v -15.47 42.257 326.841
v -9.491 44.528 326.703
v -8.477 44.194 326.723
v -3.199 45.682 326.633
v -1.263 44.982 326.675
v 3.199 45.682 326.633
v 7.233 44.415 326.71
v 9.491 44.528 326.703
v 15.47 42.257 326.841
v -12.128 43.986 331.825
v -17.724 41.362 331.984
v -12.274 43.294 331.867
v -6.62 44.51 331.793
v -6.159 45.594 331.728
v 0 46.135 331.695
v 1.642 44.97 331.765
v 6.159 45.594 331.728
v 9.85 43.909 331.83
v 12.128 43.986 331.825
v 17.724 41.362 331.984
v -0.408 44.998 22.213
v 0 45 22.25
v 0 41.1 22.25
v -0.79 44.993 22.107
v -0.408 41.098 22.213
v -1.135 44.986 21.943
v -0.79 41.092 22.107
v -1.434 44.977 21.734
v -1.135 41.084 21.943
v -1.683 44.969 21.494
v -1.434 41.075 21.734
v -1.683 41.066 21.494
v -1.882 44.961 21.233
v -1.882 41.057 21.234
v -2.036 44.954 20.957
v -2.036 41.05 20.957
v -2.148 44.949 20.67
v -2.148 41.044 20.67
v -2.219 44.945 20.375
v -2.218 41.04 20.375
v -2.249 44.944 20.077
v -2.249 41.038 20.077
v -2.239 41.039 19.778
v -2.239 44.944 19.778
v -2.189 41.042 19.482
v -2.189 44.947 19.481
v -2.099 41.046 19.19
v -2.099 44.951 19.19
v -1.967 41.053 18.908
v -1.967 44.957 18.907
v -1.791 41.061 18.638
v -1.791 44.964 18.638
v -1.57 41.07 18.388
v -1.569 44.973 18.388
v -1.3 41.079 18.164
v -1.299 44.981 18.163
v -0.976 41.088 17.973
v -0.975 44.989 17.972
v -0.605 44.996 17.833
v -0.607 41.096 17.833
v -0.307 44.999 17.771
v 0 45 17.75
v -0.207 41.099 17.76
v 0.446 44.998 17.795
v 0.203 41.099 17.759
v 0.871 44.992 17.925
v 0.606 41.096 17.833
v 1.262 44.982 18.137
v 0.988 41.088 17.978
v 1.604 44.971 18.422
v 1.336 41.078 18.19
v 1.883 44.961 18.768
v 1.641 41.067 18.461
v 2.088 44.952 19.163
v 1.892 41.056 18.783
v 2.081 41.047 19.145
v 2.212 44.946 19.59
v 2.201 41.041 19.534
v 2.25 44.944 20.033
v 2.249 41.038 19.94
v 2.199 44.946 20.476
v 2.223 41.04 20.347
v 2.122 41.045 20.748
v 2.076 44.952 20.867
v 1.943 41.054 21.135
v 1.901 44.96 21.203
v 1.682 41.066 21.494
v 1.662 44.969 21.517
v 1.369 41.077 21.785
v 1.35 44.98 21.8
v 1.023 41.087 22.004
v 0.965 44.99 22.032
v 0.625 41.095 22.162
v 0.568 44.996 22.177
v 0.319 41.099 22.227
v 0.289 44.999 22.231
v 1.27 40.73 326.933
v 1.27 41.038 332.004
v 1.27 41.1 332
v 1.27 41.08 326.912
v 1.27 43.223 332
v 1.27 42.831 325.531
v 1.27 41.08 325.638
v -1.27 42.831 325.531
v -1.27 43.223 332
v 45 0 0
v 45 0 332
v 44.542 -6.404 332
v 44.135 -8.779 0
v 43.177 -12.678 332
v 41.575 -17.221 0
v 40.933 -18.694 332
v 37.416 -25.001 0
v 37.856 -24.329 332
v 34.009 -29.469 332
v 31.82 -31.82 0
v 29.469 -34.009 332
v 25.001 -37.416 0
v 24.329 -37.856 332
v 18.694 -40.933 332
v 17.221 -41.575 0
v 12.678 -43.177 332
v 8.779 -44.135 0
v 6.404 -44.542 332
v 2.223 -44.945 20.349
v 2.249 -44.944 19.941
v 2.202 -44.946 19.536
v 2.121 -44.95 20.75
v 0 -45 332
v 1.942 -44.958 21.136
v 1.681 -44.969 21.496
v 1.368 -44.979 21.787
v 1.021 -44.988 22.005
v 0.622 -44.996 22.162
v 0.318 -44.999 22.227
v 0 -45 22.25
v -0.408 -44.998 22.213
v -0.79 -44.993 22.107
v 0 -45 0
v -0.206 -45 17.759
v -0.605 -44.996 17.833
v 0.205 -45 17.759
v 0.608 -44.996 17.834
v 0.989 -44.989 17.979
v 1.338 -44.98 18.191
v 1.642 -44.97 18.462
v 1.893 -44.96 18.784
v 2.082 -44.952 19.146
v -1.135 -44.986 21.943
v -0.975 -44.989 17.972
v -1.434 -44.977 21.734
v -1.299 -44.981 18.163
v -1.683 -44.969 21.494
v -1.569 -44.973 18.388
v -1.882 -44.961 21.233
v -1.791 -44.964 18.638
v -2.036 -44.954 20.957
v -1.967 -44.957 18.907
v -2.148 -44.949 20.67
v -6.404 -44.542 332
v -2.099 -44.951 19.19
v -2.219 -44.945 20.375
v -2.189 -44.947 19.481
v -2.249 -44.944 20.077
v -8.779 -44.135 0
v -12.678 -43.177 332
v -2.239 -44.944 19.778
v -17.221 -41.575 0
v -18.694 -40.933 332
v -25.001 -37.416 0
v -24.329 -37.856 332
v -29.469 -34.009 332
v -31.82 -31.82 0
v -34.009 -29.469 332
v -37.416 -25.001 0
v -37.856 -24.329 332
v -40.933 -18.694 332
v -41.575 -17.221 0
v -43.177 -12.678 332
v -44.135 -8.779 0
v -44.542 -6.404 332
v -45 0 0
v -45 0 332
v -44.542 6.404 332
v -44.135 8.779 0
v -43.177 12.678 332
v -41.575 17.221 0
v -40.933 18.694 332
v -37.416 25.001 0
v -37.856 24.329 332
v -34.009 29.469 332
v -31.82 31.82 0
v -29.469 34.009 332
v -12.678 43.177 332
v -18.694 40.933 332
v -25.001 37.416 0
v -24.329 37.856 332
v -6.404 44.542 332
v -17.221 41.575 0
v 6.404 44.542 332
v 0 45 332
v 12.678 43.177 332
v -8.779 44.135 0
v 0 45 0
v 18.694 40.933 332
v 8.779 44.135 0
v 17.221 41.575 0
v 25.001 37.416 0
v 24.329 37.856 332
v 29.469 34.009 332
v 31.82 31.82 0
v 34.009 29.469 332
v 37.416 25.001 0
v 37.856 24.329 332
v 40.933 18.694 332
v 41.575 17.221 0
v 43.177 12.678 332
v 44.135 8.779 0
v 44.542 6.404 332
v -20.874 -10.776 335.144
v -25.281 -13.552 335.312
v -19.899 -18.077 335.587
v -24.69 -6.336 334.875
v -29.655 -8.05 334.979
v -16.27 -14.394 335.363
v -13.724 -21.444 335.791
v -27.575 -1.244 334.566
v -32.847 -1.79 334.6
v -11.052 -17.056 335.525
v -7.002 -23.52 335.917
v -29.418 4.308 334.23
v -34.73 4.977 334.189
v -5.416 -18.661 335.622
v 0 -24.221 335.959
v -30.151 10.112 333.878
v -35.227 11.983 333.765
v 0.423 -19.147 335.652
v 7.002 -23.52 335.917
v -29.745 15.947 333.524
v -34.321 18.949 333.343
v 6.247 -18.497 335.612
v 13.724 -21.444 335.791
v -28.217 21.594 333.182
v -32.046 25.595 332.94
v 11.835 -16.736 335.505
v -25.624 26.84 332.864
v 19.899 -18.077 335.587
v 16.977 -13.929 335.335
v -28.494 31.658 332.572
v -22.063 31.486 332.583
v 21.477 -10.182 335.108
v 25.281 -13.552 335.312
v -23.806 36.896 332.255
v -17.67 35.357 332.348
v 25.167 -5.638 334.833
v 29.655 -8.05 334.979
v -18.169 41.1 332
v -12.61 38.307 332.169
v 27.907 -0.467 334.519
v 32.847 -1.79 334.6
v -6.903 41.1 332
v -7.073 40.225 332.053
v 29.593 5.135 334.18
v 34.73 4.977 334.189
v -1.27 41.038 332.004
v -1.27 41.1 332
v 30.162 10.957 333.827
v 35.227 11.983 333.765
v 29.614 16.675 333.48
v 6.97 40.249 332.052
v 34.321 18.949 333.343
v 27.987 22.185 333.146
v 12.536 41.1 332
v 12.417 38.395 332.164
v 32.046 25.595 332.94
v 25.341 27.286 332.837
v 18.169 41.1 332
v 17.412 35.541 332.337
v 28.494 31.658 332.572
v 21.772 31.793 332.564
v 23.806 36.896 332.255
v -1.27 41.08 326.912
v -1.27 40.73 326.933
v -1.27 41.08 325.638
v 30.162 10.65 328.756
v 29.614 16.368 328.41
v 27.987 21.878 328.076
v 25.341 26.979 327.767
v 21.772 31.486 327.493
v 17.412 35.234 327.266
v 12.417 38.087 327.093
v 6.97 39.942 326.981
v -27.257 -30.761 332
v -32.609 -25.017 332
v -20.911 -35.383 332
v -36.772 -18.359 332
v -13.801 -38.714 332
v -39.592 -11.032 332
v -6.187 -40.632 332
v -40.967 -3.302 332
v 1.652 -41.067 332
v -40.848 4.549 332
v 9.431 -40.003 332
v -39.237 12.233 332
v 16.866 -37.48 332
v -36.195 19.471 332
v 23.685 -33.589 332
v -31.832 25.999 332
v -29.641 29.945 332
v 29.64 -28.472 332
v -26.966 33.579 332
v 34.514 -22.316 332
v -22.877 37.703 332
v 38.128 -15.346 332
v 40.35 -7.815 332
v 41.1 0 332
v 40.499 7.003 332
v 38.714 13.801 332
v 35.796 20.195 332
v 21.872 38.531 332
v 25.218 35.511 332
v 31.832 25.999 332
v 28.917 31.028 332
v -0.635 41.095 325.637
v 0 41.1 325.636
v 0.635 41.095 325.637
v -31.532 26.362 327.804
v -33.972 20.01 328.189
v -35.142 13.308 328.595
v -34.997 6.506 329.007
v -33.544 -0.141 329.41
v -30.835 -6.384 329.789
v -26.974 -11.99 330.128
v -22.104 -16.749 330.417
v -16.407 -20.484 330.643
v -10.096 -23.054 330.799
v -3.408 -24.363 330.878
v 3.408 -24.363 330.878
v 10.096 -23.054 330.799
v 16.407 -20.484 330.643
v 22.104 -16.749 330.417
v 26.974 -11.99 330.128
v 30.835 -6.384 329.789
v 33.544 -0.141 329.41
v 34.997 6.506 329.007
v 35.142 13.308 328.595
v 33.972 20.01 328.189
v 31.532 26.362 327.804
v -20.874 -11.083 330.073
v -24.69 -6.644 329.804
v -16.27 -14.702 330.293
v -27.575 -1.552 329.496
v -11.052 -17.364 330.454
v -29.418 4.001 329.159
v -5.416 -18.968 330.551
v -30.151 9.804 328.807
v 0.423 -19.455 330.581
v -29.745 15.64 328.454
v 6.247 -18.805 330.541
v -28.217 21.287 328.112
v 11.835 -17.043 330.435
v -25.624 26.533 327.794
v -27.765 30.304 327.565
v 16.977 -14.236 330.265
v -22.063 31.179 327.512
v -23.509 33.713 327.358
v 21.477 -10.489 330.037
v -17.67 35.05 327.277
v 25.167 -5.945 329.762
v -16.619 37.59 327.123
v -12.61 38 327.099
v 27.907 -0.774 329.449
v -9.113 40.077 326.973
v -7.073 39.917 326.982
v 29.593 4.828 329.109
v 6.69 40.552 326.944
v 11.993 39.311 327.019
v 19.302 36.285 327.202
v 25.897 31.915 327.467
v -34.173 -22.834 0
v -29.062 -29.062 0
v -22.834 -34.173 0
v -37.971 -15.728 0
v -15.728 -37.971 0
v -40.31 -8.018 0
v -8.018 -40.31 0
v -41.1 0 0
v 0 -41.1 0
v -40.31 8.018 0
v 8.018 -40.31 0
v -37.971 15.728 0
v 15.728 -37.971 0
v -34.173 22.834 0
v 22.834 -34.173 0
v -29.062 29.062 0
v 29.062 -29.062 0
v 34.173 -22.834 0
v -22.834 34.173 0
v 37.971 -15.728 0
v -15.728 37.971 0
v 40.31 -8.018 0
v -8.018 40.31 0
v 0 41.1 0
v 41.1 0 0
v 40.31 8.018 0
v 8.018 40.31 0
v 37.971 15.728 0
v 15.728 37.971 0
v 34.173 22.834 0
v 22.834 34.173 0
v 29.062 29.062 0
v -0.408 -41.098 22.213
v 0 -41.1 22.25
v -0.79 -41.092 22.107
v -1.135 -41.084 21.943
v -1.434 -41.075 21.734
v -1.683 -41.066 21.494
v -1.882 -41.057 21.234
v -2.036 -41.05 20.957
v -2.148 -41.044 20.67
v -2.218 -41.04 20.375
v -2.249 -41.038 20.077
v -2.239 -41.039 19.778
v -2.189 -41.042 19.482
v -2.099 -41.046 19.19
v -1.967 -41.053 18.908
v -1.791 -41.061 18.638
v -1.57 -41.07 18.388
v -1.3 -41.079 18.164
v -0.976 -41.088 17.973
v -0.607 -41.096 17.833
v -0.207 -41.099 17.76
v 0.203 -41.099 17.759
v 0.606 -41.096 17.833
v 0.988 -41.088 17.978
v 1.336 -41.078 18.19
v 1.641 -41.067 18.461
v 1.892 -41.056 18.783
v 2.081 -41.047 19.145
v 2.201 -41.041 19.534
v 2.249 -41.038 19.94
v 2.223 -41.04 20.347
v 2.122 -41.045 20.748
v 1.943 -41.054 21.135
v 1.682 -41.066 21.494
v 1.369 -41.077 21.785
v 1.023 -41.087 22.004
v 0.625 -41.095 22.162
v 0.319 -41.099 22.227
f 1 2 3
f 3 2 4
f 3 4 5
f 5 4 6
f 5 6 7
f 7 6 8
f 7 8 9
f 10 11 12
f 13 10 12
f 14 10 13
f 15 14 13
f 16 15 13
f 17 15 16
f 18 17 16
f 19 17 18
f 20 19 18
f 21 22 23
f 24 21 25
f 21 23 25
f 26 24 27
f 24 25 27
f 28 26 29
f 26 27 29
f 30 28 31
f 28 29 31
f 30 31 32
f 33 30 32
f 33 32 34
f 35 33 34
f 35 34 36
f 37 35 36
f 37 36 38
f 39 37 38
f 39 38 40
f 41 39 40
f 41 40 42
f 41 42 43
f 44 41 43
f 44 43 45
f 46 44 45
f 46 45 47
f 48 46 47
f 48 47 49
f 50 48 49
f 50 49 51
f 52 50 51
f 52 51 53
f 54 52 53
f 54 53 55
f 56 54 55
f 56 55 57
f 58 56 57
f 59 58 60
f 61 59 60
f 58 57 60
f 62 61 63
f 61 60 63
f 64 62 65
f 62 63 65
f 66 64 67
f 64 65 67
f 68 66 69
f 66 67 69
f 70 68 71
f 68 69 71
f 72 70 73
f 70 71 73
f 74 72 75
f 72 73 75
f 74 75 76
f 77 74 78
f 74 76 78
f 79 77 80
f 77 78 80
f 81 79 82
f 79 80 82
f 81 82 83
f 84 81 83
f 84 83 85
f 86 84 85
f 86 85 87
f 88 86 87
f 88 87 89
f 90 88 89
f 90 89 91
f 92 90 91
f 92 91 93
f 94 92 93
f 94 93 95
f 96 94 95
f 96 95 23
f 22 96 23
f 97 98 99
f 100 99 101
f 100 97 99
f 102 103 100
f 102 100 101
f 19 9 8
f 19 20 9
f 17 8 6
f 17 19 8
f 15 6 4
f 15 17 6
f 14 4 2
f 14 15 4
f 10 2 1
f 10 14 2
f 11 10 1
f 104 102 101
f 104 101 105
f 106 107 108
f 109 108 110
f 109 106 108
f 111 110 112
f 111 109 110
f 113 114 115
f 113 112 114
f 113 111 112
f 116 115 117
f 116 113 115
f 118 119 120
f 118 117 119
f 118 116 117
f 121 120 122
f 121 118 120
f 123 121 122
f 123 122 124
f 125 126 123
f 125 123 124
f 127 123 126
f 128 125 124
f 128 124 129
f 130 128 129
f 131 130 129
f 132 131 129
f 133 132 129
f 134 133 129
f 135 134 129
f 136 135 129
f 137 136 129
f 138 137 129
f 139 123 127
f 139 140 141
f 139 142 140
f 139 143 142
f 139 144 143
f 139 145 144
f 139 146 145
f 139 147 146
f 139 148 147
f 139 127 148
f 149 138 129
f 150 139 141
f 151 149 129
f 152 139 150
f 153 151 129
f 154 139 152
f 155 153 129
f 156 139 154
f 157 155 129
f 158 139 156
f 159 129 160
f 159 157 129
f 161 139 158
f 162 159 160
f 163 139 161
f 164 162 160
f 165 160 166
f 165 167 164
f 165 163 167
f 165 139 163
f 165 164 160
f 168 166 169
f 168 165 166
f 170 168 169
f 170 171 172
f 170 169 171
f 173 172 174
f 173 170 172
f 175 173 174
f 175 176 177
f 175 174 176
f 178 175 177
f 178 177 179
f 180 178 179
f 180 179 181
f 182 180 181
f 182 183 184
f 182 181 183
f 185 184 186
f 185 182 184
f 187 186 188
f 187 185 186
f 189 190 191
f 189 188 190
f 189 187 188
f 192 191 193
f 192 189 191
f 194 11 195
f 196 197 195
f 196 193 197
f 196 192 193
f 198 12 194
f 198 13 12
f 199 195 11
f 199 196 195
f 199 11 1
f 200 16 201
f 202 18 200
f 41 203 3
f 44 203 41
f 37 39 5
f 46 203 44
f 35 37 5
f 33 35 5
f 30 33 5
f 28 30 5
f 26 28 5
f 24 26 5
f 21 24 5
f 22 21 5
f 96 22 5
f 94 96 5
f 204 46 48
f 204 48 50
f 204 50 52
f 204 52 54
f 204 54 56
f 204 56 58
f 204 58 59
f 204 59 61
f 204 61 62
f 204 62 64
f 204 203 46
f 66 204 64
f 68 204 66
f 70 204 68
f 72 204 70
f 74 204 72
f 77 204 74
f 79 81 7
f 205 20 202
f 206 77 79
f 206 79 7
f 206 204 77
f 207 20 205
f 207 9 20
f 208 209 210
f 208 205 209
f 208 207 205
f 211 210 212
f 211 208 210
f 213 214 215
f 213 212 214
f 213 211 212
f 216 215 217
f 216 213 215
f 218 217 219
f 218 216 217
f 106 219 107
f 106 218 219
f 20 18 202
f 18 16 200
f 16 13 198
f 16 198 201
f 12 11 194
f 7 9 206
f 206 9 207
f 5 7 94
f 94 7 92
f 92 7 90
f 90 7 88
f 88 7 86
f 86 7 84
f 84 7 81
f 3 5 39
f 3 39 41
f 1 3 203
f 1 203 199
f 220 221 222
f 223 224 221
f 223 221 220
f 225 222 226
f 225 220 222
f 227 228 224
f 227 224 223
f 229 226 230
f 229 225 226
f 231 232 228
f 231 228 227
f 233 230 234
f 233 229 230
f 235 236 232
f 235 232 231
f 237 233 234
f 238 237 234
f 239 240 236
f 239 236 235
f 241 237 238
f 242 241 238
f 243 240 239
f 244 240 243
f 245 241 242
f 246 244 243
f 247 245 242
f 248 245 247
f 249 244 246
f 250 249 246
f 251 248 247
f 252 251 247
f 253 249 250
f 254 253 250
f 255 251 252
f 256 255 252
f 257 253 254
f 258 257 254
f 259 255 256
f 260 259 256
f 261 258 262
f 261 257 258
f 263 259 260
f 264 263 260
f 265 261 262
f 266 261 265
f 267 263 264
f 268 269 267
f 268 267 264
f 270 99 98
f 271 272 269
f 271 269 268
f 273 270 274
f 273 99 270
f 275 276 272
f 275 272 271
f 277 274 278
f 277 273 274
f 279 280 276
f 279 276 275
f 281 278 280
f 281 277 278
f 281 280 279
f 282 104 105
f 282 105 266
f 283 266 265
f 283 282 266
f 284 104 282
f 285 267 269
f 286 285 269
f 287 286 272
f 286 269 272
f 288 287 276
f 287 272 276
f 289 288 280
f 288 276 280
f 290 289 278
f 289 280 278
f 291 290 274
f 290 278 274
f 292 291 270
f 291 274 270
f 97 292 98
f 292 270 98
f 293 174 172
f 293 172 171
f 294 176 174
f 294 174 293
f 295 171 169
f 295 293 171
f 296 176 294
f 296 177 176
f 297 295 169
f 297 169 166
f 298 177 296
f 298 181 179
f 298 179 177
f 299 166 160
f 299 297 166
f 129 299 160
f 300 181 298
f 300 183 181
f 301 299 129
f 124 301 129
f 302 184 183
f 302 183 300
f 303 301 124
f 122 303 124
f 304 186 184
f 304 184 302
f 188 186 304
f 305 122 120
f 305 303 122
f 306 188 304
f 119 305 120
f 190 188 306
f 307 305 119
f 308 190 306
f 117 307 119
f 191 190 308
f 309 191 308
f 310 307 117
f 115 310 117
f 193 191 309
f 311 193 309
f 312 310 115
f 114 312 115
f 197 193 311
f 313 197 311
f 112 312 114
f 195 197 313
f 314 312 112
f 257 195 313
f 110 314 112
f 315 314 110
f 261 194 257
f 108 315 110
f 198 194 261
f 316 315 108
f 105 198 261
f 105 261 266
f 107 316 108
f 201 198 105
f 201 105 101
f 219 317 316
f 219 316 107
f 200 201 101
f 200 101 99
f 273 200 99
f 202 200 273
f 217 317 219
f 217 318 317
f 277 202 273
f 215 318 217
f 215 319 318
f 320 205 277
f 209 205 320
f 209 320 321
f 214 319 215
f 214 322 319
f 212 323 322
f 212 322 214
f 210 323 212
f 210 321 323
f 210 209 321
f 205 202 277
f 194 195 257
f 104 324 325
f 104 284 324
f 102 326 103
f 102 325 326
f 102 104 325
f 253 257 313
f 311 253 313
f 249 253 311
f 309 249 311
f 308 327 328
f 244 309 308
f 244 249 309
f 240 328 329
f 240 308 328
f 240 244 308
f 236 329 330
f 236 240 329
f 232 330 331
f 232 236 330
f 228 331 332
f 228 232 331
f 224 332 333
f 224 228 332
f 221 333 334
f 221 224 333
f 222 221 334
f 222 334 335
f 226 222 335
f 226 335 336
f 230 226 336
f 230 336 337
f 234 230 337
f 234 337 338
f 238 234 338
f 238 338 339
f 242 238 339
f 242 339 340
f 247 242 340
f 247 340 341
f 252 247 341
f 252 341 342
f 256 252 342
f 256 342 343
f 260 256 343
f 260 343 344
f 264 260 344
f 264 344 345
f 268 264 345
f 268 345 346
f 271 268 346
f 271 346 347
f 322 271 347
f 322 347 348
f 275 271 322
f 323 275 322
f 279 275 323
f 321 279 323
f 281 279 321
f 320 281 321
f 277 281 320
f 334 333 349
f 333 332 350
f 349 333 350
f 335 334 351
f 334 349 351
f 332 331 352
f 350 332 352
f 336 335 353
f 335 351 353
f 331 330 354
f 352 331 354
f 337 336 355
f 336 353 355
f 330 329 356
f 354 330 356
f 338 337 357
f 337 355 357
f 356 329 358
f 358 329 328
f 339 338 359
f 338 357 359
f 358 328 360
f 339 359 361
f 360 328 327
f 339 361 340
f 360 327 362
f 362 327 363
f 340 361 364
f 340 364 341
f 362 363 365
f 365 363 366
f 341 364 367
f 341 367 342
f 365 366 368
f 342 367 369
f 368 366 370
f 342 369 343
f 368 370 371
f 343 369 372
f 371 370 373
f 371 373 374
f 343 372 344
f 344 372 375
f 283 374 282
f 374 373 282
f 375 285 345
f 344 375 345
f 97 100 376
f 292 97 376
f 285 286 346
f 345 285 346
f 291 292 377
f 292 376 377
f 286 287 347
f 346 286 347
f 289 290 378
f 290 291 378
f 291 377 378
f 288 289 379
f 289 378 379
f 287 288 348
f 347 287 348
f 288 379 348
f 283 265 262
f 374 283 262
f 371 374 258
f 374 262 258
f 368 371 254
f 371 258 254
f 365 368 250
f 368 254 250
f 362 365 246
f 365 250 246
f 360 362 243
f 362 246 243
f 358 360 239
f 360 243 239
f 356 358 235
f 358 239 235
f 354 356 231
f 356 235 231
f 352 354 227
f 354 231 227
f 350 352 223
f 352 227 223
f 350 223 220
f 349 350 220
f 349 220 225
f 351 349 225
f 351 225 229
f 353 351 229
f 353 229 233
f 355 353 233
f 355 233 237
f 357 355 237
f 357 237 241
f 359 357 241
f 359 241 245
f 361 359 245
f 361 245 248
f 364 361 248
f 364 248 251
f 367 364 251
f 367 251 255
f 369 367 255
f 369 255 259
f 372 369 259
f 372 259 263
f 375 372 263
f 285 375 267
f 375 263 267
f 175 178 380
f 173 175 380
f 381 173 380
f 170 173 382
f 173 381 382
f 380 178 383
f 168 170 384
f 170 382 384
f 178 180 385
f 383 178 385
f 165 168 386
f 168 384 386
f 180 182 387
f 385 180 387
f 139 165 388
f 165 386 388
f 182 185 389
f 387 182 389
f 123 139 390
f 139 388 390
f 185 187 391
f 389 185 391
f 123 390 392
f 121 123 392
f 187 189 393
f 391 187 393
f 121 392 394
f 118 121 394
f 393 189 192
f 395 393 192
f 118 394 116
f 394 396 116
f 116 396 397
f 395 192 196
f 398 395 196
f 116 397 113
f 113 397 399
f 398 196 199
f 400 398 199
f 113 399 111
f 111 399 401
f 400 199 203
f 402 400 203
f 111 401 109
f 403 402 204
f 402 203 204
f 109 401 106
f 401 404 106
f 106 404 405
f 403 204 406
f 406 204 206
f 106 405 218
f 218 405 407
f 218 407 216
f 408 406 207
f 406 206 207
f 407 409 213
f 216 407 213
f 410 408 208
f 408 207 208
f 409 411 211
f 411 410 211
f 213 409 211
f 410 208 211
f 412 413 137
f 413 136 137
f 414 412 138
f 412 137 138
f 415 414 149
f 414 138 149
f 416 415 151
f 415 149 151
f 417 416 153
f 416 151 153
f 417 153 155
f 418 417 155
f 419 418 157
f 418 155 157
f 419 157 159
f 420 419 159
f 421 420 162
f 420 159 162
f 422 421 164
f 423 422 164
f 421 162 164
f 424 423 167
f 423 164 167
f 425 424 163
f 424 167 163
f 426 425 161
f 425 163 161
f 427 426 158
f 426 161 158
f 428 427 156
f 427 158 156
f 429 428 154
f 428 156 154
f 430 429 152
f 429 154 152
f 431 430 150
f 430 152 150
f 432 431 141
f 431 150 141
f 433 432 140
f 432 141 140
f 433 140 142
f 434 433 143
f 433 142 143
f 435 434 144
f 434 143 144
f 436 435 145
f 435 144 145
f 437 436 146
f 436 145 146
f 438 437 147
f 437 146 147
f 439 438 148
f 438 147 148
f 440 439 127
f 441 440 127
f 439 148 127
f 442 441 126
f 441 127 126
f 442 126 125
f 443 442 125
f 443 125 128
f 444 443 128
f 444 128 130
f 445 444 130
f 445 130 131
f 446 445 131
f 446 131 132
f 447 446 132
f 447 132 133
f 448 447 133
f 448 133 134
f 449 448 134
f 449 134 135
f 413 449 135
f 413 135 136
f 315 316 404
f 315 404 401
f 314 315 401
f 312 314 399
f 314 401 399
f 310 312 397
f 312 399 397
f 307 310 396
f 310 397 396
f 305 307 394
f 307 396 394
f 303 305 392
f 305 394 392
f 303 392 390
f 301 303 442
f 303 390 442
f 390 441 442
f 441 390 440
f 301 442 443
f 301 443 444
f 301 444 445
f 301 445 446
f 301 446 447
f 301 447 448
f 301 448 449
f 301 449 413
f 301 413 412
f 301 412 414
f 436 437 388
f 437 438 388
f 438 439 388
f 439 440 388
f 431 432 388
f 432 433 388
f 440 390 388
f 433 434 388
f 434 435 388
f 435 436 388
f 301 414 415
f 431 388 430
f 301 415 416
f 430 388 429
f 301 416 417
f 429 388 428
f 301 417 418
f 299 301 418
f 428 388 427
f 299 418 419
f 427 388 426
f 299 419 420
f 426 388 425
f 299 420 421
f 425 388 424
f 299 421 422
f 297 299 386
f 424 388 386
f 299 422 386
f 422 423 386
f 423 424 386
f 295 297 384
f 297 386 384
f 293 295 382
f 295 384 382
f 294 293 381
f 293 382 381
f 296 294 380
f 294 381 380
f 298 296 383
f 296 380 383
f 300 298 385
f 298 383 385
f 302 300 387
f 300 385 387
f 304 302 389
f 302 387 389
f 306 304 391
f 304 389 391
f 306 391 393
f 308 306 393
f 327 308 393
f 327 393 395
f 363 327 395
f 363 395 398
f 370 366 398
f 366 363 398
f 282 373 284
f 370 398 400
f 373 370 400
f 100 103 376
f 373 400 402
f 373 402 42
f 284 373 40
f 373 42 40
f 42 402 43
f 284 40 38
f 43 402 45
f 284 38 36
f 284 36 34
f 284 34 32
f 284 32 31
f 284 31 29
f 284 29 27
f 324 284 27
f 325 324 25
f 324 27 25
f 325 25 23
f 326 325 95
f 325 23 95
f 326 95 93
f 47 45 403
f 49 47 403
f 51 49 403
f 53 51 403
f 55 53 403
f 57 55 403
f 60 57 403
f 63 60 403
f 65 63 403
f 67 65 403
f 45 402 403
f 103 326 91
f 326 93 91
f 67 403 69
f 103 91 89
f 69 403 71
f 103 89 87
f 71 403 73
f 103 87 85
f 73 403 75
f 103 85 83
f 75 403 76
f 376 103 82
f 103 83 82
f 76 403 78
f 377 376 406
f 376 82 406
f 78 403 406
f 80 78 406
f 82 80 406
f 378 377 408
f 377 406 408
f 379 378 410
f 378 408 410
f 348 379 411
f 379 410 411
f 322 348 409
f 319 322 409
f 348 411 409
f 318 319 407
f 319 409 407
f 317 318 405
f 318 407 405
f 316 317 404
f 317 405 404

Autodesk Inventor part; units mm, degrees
ref_plane "YZ Plane" through (0, 0, 0) normal (1, 0, 0) x (0, 1, 0)
sketch "Sketch1" plane through (0, 0, 0) normal (0, 0, 1) x (1, 0, 0)
  circle A0 centre (0, 0) radius 45
  circle A1 centre (0, 0) radius 41.1
  dimension "d0" = 90
  dimension "d2" = 3.9
extrude "Extrusion1" add sketch "Sketch1" along normal blind 332
sketch "Sketch2" plane through (0, 0, 332) normal (0, 0, 1) x (1, 0, 0)
  circle A0 centre (0, 0) radius 41.1 projected
  circle A1 centre (0, 0) radius 45 projected
  point P0 (0, 45)
ref_plane "Work Plane1" through (0, 45, 332) normal (0, 1, 0) x (-1, 0, 0)
sketch "Sketch5" plane through (0, 45, 332) normal (0, 1, 0) x (-1, 0, 0)
  circle A0 centre (0, -312) radius 4.4901
  point P0 (0, -332)
  dimension "d25" = 20
hole "nailHole" at (0, 45, 20) direction (0, -1, 0) diameter 4.5 end through all
sketch "Sketch6" plane through (0, 0, 332) normal (0, 0, 1) x (1, 0, 0)
  circle A0 centre (0, 0) radius 41.1 projected
  circle A1 centre (0, 0) radius 45 projected
  point P0 (0, 45)
ref_plane "Work Plane2" through (0, 45, 332) normal (0, 1, 0) x (-1, 0, 0)
sketch "Sketch10" plane through (0, 0, 332) normal (0, 0, 1) x (1, 0, 0)
  circle A0 centre (0, 0) radius 41.1 projected
  circle A1 centre (0, 0) radius 45 projected
  line L0 (0, 41.1) -> (46.8002, 41.1) construction
ref_plane "Work Plane3" through (0, 41.1, 332) normal (0, 0.0605, 0.9982) x (1, 0, 0)
sketch "Sketch11" plane through (0, 41.1, 332) normal (0, 0.0605, 0.9982) x (1, 0, 0)
  circle A0 centre (0, -30.1983) radius 30.1625
  circle A1 centre (0, -30.1983) radius 35.2425
  point P0 (0, -20.93)
  dimension "d44" = 60.325
  dimension "d45" = 5.08
extrude "INSERT_GUIDE_NOTFAB" add sketch "Sketch11" against normal blind 5.08
sketch "Sketch12" plane through (0, 41.1, 332) normal (0, 0.0605, 0.9982) x (1, 0, 0)
  circle A0 centre (0, -30.1983) radius 30.1625 projected
  line L0 (-1.27, -0.4213) -> (1.27, -0.4213)
  line L1 (1.27, -0.4213) -> (1.27, 2.1187)
  line L2 (1.27, 2.1187) -> (-1.27, 2.1187)
  line L3 (-1.27, 2.1187) -> (-1.27, -0.4213)
  line L4 (0, 2.1187) -> (0, -0.4213) construction
  line L5 (0, -20.93) -> (0, -30.1983) construction
  dimension "d48" = 2.54
  dimension "d49" = 2.54
extrude "INSERT_KEY_NOTFAB" cut sketch "Sketch12" along normal mid plane 12.7 contours L1 L0 L3 A0 | A0 L3 L2 L1 picked at (0.1411, -0.2938)
sketch "Sketch14" plane through (0, 0, 332) normal (0, 0, 1) x (1, 0, 0)
  circle A0 centre (0, 0) radius 41.1 projected
  line L0 (-6.35, 38.1) -> (6.35, 38.1)
  line L1 (0, 41.1) -> (0, 38.1) construction
  line L2 (-6.35, 38.1) -> (-6.35, 40.6065)
  line L3 (6.35, 38.1) -> (6.35, 40.6065)
  dimension "d52" = 12.7
  dimension "d53" = 3
extrude "shim" [suppressed]
equation "\"d0\" = sleeveOD"
equation "\"d2\" = sleeveWall"
equation "\"d3\" = sleeveLength"
equation "\"d25\" = nailDelta"
equation "\"sleeveOD\" = 90"
equation "\"sleeveWall\" = 3.9"
equation "\"sleeveLength\" = 332"
equation "\"nailDelta\" = 20"
equation "\"sparLaunchAngle\" = 3.72deg"
properties part number "2h2slv" material "PVC-Piping"
